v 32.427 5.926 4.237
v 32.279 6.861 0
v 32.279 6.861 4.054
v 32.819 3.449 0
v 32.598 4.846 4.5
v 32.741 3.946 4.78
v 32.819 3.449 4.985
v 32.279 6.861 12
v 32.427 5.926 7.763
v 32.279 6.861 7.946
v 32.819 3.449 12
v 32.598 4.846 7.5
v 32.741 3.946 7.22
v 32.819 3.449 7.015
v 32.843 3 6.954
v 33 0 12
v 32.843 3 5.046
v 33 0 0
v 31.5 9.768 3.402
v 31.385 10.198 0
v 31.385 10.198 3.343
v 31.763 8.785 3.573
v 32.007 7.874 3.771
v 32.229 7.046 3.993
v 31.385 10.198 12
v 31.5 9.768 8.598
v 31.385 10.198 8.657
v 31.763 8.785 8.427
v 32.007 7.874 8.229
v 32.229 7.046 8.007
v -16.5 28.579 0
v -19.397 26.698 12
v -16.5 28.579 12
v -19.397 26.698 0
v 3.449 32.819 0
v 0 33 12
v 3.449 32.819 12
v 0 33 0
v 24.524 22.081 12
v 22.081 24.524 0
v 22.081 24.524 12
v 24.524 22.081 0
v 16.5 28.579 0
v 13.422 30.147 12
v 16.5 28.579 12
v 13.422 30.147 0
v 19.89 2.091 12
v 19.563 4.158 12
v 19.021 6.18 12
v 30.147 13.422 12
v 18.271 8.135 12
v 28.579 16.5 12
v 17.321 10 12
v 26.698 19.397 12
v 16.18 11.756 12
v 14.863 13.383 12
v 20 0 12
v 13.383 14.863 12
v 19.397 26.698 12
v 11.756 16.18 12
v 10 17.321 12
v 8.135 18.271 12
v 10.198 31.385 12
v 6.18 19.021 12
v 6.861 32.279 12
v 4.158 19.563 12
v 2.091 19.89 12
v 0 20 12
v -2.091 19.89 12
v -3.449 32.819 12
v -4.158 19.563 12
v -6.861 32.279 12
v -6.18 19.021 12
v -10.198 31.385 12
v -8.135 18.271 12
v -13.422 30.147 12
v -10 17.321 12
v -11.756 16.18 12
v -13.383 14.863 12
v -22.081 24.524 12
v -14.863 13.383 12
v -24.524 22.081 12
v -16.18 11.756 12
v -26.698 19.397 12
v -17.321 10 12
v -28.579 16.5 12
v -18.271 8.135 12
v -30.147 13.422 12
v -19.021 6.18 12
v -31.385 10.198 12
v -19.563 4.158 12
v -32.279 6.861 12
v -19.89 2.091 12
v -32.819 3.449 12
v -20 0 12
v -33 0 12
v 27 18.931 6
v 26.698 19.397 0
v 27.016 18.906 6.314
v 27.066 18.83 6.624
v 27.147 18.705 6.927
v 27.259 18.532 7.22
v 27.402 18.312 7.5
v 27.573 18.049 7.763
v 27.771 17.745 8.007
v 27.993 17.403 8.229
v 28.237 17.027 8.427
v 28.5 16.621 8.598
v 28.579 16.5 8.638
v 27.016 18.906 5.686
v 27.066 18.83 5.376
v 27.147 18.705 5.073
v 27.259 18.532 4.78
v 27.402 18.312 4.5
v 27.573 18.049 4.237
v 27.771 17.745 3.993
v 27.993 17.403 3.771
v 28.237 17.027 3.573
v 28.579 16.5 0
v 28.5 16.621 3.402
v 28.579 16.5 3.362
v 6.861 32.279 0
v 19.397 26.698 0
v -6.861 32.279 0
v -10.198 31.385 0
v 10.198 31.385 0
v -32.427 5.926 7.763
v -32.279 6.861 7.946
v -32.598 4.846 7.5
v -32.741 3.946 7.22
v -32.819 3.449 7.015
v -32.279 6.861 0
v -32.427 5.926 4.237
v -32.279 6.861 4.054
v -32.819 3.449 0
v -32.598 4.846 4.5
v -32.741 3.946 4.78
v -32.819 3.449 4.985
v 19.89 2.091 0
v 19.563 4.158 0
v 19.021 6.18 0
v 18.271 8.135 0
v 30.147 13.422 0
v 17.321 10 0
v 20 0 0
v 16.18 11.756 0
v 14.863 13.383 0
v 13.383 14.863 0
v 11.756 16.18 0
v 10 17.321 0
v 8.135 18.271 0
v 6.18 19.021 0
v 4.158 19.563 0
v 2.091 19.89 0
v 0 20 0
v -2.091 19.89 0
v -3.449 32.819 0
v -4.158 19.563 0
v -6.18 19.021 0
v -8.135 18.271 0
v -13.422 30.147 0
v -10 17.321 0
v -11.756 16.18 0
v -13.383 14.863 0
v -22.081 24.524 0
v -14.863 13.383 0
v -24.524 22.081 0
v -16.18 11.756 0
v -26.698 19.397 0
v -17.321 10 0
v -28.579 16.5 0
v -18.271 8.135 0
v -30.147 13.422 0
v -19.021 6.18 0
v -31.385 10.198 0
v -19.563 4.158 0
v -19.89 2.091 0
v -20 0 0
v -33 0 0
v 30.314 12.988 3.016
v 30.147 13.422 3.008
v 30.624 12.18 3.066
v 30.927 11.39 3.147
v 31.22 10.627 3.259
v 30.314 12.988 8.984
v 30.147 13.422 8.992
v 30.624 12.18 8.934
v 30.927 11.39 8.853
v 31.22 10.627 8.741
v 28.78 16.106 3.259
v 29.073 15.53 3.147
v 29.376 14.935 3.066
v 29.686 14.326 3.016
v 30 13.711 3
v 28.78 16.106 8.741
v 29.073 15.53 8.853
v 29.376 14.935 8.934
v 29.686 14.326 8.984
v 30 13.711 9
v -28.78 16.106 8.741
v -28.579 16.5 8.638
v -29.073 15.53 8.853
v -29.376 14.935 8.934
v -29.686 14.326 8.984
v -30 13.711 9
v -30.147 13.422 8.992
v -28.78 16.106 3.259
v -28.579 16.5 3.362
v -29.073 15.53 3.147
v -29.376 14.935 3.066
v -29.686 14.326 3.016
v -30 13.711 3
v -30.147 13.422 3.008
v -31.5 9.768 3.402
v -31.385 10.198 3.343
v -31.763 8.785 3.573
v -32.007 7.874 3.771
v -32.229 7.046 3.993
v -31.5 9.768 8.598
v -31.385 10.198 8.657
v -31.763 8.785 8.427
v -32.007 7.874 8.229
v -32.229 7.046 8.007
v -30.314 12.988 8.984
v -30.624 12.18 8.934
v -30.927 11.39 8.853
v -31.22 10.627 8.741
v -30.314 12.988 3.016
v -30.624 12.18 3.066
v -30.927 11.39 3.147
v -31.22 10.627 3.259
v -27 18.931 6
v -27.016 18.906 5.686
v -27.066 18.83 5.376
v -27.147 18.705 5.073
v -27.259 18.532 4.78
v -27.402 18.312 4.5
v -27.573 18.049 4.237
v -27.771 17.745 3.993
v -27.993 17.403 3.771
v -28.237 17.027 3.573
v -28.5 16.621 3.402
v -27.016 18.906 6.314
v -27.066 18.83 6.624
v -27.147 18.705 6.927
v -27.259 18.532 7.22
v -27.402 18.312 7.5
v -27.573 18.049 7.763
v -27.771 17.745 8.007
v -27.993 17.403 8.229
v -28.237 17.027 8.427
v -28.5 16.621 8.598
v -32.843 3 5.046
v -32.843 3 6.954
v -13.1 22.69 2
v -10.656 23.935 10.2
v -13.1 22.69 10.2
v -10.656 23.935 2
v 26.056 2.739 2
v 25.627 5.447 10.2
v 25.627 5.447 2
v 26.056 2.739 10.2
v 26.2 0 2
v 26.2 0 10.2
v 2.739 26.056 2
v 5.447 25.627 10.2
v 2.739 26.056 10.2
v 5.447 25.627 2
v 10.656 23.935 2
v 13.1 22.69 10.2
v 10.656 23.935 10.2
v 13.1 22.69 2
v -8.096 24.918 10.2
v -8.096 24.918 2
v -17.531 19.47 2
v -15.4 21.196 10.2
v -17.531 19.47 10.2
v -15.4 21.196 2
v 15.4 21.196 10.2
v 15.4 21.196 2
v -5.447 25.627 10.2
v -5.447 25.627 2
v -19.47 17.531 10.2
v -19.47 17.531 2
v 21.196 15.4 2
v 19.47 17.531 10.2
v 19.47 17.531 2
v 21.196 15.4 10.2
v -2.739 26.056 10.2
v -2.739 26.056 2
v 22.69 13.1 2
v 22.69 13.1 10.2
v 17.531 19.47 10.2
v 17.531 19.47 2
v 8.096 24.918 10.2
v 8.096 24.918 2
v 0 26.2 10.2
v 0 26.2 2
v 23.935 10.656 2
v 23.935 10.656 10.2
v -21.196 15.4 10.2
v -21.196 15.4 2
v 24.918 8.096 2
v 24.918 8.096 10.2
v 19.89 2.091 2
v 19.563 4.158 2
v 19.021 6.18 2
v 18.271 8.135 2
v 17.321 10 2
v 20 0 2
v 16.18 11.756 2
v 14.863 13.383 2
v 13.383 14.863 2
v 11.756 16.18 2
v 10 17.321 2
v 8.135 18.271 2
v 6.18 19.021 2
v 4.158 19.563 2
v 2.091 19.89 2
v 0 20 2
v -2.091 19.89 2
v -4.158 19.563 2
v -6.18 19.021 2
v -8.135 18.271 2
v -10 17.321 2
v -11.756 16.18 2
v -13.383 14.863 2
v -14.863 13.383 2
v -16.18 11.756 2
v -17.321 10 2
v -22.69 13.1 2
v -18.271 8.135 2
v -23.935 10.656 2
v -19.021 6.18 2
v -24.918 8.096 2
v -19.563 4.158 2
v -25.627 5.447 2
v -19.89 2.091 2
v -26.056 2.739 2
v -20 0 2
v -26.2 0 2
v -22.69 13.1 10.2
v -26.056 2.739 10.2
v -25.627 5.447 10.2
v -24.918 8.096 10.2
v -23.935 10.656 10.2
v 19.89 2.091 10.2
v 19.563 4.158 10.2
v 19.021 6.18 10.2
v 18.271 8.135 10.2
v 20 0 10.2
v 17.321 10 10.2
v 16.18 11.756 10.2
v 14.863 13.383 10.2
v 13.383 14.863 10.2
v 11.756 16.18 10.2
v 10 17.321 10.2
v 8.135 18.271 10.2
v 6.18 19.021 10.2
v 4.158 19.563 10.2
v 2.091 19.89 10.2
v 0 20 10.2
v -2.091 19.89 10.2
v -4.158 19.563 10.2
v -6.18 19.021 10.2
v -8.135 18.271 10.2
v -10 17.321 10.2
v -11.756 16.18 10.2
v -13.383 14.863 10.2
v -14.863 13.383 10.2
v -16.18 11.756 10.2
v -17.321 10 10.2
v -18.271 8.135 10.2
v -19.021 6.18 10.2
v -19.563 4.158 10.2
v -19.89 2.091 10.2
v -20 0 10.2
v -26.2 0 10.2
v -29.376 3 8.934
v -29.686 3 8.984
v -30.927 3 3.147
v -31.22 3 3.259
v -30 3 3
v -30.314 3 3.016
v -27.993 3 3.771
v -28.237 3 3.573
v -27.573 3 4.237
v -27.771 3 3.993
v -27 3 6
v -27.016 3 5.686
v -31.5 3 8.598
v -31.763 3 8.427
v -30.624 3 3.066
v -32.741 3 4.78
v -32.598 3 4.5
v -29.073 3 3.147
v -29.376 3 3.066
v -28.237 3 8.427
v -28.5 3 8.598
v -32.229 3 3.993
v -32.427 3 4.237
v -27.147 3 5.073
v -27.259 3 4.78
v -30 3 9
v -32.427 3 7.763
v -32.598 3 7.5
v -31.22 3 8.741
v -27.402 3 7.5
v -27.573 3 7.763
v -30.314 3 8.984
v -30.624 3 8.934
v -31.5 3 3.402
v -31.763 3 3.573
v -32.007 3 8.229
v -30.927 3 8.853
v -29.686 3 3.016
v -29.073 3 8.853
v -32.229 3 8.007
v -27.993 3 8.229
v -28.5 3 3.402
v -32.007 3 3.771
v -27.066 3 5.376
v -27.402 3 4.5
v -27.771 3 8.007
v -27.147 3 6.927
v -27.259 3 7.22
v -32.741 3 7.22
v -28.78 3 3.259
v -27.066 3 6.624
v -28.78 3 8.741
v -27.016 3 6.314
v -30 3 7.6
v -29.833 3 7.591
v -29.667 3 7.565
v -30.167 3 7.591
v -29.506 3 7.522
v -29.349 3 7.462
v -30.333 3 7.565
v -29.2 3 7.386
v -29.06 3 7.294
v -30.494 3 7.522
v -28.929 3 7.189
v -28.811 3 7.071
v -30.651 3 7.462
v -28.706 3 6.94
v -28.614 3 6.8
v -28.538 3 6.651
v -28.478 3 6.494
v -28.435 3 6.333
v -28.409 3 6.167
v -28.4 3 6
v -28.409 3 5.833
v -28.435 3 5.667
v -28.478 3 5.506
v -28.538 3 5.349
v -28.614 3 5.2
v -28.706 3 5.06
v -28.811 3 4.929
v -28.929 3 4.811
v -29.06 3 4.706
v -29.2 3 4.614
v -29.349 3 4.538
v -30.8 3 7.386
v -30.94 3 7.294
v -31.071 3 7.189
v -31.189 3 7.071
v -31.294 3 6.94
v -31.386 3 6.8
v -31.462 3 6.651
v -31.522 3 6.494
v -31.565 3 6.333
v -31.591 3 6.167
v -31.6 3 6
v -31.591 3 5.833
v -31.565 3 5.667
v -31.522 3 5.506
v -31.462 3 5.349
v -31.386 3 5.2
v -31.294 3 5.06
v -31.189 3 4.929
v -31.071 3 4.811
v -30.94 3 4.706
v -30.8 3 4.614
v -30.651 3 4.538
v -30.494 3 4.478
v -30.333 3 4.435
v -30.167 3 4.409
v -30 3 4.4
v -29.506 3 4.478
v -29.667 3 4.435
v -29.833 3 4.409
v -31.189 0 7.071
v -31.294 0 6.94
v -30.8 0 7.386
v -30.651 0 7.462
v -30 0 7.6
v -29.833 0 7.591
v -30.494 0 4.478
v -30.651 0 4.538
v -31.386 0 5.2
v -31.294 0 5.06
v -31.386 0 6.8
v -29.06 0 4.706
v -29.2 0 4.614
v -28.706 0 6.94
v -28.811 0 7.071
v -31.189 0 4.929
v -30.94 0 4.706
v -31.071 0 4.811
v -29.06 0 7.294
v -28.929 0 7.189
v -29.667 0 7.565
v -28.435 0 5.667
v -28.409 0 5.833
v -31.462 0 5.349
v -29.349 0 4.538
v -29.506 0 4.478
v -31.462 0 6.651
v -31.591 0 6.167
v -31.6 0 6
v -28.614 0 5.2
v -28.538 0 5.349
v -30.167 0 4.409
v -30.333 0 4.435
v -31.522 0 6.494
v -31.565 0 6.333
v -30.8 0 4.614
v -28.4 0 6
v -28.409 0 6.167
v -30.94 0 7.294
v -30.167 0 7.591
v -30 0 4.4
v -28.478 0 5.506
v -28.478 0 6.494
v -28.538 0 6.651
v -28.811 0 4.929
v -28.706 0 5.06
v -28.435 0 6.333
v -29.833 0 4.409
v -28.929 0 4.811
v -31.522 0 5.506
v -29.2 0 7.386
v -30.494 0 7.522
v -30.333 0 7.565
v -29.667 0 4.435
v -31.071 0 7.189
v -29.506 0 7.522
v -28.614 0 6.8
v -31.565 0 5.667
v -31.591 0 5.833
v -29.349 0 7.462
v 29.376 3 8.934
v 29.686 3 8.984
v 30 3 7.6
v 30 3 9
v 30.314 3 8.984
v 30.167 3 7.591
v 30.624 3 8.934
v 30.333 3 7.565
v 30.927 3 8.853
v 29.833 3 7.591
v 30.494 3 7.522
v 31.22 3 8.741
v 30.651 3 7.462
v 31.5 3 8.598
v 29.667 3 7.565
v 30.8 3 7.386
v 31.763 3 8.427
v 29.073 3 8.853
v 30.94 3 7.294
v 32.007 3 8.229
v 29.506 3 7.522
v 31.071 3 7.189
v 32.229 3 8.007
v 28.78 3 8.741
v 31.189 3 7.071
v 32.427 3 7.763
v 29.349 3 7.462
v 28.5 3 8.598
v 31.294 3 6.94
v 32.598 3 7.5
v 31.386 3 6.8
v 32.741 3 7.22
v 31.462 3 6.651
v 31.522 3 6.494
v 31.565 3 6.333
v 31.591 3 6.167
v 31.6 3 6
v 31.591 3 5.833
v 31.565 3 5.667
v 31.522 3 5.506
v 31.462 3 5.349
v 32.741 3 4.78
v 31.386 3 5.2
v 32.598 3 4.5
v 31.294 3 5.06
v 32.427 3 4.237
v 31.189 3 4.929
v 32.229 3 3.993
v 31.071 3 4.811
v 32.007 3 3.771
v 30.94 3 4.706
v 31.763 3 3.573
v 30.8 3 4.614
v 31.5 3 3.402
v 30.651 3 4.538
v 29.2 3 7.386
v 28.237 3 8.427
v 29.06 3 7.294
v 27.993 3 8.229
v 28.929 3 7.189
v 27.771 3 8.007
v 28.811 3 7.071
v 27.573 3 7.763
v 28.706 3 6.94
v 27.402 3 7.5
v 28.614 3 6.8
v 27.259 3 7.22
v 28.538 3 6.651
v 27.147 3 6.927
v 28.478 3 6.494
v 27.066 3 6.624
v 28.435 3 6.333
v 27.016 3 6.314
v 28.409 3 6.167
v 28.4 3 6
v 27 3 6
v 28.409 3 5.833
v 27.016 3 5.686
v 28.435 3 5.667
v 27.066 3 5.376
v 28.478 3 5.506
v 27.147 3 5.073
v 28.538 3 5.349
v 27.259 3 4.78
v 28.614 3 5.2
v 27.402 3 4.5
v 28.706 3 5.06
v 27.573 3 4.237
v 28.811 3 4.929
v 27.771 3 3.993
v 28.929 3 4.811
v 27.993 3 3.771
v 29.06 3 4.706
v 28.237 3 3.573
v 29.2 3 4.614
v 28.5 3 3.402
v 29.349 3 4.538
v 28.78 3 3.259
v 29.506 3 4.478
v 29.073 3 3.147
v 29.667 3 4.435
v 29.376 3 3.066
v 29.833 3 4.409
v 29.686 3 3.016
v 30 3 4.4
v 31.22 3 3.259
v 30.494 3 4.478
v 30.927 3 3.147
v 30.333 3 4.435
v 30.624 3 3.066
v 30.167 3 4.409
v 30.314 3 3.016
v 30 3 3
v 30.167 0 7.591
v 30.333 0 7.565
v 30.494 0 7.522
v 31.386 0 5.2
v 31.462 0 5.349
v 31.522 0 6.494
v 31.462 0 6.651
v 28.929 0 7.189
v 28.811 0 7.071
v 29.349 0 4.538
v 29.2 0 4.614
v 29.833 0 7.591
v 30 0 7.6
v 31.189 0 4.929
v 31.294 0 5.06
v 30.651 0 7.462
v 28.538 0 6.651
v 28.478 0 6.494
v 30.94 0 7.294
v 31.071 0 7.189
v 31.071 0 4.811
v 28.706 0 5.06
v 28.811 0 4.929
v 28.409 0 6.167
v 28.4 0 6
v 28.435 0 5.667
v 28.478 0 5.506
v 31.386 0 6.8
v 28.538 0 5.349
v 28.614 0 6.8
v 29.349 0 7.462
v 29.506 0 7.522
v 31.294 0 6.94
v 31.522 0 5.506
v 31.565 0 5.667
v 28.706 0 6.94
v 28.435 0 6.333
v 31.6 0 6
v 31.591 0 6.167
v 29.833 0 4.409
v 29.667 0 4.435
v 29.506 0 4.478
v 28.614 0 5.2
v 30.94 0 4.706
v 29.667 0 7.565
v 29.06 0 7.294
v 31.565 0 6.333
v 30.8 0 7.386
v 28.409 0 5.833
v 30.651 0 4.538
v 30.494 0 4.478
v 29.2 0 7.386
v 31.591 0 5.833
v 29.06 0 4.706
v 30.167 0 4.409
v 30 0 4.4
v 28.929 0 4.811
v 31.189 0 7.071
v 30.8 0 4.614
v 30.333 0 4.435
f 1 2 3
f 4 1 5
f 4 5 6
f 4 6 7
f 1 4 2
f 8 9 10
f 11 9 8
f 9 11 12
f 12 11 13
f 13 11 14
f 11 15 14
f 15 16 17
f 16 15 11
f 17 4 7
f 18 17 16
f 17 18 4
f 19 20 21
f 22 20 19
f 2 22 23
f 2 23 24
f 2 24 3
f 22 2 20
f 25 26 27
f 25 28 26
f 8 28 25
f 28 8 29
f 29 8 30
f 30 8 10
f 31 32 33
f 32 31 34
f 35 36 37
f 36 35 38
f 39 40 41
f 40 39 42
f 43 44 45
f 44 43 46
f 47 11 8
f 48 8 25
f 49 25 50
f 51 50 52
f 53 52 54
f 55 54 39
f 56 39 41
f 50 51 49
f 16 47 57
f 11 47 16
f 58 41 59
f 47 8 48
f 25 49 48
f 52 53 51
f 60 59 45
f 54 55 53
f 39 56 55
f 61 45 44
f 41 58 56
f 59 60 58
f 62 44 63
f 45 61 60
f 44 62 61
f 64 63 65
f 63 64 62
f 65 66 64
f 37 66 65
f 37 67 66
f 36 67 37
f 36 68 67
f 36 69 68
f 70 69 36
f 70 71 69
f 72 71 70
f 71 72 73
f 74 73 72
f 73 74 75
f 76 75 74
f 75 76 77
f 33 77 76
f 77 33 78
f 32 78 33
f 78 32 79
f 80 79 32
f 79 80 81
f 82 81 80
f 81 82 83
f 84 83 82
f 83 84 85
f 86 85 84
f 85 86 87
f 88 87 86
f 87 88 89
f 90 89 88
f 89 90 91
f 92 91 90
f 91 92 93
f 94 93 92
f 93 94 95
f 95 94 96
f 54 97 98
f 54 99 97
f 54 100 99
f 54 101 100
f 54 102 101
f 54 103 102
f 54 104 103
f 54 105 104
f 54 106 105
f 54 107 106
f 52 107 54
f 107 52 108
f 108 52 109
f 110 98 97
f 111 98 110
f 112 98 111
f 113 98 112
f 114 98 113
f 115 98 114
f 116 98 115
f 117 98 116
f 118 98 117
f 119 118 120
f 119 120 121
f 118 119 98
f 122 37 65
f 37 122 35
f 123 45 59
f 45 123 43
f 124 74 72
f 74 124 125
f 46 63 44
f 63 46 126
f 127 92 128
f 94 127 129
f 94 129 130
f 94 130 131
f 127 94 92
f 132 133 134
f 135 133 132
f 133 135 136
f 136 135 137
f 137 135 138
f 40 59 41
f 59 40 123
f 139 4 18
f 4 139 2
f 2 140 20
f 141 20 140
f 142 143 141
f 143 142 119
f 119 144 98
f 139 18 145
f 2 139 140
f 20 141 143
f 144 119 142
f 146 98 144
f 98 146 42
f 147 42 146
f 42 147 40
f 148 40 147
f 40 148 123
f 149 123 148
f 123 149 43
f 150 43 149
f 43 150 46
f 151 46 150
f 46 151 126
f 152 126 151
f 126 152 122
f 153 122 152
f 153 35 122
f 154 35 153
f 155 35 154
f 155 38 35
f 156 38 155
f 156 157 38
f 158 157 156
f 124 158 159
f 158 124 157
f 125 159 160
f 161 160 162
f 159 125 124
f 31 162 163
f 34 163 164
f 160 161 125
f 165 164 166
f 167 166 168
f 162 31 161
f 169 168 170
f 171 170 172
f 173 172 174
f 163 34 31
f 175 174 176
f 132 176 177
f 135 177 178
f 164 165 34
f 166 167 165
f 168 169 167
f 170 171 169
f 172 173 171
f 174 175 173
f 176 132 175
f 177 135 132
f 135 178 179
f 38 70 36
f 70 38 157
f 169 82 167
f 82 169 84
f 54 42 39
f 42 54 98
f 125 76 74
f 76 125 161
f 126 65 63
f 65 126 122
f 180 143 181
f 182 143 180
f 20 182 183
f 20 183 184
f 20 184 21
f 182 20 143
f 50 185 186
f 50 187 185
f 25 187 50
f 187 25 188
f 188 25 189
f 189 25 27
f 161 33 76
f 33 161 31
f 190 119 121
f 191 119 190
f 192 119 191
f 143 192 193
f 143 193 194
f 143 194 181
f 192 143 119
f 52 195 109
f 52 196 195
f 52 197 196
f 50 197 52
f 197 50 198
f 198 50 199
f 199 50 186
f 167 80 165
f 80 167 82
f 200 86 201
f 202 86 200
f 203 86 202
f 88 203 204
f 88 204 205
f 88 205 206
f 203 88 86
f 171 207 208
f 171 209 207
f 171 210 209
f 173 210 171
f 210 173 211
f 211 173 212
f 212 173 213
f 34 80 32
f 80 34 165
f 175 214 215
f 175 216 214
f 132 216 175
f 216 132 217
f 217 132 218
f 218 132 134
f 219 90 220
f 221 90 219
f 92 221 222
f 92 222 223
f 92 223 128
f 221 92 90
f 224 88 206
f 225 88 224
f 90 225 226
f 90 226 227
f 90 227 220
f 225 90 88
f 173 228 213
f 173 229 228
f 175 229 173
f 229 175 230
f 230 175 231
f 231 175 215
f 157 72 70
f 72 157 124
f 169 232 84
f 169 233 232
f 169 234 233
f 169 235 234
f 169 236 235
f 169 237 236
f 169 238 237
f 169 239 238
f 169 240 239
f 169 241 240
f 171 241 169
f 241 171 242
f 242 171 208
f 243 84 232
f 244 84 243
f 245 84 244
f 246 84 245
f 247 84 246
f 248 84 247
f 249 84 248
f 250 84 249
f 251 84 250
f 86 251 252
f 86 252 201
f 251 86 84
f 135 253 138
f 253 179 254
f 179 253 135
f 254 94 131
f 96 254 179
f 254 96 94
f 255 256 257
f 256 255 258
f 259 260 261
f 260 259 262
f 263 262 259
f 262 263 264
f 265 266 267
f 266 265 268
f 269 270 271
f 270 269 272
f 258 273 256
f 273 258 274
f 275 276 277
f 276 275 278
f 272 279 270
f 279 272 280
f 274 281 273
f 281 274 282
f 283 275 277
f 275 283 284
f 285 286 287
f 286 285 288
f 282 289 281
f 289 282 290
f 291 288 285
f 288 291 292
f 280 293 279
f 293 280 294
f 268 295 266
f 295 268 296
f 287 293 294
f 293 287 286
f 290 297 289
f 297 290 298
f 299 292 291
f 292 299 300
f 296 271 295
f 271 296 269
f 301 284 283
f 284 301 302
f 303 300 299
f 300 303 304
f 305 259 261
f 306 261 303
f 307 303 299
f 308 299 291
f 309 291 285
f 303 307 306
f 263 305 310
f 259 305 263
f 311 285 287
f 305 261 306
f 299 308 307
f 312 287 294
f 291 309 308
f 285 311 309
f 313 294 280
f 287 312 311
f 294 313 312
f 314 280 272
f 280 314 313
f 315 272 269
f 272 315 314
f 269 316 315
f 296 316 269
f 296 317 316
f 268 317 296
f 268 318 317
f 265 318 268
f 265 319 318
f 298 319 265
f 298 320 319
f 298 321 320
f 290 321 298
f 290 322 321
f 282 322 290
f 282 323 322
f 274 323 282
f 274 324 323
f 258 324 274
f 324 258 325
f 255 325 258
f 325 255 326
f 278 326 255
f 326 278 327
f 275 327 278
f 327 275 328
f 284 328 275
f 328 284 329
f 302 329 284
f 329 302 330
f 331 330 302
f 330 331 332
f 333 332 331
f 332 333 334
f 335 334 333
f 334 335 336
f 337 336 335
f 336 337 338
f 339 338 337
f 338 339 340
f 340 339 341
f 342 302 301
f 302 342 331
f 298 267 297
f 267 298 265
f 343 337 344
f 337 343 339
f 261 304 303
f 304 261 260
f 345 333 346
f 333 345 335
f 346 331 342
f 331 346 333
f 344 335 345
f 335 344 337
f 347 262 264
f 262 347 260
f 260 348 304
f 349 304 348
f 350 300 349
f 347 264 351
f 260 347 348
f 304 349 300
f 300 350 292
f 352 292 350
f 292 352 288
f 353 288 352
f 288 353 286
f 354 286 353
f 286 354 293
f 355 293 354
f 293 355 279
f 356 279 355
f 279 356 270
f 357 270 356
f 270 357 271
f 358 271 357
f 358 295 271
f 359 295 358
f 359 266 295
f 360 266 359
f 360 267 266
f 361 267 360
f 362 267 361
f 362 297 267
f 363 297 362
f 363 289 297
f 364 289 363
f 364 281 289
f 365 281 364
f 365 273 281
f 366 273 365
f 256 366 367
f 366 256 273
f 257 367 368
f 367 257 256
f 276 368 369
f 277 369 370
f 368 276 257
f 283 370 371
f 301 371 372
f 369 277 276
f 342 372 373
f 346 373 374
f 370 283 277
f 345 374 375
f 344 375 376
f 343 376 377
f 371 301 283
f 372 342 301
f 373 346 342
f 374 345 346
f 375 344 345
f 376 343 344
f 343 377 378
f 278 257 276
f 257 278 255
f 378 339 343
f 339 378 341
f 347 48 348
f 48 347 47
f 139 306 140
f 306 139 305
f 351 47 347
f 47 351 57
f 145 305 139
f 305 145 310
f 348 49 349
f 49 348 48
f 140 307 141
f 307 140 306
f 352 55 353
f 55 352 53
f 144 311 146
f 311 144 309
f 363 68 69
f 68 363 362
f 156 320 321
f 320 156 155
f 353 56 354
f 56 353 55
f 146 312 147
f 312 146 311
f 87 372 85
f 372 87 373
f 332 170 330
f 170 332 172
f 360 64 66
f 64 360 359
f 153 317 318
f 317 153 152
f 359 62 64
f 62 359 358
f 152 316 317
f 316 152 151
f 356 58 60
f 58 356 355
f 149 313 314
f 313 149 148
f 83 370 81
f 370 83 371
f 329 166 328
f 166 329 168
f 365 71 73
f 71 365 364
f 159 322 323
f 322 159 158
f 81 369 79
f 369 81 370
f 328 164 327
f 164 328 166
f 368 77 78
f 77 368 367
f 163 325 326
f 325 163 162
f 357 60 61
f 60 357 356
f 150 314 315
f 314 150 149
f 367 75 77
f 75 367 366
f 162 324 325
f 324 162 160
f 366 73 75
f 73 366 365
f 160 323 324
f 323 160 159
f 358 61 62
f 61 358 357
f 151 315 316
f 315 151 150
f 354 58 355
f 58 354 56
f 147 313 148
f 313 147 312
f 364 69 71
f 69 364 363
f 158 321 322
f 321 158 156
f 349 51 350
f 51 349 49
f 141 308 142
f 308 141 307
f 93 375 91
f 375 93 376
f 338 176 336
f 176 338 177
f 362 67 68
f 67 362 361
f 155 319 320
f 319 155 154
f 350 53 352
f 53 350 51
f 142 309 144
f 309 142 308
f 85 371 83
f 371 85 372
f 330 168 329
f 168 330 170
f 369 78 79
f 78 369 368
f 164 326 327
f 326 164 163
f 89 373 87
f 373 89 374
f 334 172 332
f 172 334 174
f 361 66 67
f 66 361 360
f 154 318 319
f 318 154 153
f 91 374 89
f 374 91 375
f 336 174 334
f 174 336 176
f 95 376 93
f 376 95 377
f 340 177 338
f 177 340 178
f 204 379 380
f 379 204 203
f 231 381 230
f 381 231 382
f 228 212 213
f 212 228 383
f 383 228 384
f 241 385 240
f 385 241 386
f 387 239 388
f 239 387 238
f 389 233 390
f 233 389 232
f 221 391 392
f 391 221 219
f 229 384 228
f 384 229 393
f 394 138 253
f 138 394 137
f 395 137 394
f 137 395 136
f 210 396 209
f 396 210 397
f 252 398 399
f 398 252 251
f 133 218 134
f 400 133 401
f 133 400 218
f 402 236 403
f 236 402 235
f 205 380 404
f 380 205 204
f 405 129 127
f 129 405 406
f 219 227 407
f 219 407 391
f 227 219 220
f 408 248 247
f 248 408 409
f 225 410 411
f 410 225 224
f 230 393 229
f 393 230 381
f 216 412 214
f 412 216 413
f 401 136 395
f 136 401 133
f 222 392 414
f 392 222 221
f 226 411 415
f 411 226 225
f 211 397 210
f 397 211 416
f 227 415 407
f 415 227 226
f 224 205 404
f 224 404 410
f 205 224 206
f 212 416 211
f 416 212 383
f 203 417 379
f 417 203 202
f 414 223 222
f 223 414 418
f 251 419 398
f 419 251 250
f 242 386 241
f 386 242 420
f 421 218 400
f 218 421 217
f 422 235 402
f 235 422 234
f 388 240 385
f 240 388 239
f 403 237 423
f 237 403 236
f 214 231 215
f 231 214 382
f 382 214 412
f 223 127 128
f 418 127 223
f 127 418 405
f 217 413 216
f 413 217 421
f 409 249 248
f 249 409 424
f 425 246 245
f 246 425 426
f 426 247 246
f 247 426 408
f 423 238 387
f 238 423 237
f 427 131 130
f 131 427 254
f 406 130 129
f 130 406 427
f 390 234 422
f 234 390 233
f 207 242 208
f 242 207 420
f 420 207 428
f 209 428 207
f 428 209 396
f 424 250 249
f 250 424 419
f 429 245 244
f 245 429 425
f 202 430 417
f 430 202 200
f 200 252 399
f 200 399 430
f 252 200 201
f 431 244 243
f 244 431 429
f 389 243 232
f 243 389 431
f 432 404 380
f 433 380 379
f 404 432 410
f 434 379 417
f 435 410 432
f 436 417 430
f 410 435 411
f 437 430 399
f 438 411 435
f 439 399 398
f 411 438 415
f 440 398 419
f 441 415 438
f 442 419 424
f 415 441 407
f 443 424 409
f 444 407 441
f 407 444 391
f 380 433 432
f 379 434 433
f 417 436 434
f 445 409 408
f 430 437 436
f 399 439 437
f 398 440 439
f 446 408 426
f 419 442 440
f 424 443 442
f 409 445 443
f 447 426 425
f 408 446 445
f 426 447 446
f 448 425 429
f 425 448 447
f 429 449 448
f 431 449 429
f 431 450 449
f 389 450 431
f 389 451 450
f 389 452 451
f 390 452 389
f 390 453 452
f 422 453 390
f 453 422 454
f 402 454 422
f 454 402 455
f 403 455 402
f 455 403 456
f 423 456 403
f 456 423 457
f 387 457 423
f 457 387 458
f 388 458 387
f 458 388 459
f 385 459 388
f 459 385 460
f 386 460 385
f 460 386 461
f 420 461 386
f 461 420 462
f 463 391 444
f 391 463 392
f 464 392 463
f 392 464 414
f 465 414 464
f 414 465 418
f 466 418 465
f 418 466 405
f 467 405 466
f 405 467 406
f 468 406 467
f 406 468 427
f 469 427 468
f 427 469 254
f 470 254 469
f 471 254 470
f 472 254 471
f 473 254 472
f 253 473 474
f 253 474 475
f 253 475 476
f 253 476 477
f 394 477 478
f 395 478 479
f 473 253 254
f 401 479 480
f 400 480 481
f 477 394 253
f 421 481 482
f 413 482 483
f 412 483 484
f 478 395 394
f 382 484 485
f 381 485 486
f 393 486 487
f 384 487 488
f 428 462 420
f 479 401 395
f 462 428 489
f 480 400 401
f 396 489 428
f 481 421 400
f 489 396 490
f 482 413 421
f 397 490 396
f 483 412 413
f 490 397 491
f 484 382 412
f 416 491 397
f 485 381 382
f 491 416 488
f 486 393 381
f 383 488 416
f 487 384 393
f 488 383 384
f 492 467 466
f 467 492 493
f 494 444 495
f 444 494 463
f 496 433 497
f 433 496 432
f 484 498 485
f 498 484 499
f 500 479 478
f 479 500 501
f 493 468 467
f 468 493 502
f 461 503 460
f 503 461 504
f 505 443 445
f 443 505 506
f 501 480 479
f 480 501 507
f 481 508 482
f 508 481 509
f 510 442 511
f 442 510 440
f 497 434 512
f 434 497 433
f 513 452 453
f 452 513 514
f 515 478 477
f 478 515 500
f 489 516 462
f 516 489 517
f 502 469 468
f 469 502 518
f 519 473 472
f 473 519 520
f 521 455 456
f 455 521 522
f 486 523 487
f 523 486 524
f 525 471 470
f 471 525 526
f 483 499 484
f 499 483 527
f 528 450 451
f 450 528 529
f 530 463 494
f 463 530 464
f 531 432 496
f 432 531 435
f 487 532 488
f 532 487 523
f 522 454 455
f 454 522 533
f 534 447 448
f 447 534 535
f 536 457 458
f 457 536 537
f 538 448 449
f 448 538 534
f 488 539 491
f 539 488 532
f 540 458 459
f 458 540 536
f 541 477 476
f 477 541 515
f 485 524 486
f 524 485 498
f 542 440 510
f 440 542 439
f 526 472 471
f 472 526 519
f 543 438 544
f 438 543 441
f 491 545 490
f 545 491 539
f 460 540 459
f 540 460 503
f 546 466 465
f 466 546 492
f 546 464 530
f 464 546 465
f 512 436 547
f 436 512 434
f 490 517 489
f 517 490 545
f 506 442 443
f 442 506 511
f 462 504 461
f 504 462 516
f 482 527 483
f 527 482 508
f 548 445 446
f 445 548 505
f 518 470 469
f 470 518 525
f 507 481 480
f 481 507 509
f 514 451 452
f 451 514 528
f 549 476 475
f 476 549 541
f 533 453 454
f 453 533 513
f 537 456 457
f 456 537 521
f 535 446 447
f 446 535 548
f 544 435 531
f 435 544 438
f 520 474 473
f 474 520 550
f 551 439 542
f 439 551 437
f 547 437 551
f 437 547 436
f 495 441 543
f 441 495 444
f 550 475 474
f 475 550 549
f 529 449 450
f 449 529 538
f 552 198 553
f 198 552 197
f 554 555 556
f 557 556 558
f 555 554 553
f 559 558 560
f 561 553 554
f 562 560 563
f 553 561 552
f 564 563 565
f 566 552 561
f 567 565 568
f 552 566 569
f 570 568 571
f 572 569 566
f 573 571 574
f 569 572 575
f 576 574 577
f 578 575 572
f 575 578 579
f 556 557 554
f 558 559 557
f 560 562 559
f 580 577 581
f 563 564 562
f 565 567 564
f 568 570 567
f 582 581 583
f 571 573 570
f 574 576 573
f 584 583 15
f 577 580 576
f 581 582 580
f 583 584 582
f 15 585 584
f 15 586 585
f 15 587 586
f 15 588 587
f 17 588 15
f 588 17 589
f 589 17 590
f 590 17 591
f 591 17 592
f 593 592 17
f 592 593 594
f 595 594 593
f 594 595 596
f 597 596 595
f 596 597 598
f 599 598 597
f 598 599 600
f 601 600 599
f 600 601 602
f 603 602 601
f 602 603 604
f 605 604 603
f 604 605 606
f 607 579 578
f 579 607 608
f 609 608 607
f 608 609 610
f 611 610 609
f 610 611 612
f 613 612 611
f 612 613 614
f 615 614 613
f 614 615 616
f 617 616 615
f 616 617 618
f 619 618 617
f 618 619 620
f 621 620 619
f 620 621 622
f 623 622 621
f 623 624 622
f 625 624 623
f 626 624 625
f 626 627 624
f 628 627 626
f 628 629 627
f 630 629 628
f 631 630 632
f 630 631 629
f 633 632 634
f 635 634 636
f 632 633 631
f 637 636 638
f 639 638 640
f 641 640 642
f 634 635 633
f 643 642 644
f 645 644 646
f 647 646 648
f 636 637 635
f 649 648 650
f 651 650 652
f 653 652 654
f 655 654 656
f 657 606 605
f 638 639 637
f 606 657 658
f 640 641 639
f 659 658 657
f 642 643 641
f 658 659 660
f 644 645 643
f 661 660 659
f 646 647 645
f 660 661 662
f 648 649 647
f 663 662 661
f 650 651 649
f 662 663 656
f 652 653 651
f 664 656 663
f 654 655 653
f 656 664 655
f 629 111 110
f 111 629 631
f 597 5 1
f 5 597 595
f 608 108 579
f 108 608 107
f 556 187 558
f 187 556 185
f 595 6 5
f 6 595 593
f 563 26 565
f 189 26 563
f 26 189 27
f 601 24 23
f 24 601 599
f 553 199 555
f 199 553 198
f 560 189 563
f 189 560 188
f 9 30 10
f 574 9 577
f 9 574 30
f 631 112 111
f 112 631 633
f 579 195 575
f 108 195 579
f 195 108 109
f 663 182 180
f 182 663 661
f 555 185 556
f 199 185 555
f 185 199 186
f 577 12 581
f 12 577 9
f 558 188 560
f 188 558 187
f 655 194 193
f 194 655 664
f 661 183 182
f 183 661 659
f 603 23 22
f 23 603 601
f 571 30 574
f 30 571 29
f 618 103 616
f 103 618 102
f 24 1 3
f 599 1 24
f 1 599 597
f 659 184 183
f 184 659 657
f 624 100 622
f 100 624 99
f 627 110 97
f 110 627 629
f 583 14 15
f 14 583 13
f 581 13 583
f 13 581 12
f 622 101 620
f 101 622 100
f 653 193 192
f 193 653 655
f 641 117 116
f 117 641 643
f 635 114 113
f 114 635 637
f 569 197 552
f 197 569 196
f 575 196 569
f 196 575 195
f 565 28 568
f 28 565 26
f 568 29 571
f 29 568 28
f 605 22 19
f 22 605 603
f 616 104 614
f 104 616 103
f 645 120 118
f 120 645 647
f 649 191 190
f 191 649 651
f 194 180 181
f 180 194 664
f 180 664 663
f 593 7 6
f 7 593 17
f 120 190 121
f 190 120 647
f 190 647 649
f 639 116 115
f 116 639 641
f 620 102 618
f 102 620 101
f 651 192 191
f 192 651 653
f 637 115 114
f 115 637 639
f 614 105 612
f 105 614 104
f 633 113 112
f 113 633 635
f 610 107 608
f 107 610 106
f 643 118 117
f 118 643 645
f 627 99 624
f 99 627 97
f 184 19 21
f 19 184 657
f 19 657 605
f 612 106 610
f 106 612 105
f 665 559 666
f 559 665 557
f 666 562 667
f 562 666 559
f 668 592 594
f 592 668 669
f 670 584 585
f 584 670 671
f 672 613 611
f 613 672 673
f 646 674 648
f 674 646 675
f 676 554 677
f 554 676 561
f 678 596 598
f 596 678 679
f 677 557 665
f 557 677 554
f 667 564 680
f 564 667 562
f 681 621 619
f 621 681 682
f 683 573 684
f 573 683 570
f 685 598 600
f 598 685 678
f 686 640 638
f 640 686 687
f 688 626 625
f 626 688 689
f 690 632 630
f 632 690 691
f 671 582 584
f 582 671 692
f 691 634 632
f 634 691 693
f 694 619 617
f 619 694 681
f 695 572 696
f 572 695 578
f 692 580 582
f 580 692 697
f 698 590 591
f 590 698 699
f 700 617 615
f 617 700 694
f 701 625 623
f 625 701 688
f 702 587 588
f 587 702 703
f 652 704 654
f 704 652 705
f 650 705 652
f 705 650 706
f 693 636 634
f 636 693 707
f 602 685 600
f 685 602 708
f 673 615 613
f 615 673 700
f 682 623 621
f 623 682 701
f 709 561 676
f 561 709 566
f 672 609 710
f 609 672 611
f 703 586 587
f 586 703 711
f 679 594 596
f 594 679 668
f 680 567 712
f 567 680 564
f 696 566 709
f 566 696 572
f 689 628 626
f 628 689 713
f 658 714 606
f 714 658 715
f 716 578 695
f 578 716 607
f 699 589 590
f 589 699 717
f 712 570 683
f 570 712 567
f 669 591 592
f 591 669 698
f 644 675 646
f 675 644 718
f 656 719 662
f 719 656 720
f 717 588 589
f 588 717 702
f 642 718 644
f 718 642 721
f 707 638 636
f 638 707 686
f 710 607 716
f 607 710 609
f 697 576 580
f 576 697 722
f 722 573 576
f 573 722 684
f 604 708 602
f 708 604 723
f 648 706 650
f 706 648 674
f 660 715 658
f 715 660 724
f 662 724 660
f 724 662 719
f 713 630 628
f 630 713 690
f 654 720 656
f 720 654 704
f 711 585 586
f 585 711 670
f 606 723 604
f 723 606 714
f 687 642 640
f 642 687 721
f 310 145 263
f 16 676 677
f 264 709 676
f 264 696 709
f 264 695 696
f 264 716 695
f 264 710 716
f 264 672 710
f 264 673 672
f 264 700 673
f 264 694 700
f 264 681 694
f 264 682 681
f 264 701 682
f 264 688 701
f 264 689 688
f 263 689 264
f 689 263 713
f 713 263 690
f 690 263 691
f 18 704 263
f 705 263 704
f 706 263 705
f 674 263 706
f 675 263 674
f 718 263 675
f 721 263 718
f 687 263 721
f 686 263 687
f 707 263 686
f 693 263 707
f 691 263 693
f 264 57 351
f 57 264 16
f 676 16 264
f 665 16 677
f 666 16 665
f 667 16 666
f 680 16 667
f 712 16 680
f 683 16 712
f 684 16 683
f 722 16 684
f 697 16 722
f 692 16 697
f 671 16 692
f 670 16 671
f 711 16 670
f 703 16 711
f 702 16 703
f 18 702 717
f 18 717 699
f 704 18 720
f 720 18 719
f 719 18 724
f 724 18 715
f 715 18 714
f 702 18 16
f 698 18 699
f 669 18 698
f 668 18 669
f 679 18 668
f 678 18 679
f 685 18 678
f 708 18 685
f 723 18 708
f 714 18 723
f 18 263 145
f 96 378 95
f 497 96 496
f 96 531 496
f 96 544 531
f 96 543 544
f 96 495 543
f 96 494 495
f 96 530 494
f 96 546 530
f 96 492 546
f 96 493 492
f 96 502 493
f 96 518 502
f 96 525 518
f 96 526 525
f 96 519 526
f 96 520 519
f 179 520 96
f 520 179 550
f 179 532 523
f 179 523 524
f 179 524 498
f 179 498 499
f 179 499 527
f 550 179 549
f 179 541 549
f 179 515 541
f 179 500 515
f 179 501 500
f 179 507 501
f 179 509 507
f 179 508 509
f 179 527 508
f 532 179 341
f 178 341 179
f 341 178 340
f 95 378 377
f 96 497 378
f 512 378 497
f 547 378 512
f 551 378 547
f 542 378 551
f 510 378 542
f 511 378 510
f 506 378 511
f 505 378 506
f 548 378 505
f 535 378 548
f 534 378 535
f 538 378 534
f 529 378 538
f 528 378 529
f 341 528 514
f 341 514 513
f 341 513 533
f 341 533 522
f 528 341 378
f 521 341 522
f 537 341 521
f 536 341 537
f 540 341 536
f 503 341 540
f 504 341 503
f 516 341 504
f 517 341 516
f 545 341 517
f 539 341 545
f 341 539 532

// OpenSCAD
// Полузажим соединителей. Open this file, F5 preview, F6 render, export STL.
use <reference_model.scad>
$fn=60;
connector_clamp();
